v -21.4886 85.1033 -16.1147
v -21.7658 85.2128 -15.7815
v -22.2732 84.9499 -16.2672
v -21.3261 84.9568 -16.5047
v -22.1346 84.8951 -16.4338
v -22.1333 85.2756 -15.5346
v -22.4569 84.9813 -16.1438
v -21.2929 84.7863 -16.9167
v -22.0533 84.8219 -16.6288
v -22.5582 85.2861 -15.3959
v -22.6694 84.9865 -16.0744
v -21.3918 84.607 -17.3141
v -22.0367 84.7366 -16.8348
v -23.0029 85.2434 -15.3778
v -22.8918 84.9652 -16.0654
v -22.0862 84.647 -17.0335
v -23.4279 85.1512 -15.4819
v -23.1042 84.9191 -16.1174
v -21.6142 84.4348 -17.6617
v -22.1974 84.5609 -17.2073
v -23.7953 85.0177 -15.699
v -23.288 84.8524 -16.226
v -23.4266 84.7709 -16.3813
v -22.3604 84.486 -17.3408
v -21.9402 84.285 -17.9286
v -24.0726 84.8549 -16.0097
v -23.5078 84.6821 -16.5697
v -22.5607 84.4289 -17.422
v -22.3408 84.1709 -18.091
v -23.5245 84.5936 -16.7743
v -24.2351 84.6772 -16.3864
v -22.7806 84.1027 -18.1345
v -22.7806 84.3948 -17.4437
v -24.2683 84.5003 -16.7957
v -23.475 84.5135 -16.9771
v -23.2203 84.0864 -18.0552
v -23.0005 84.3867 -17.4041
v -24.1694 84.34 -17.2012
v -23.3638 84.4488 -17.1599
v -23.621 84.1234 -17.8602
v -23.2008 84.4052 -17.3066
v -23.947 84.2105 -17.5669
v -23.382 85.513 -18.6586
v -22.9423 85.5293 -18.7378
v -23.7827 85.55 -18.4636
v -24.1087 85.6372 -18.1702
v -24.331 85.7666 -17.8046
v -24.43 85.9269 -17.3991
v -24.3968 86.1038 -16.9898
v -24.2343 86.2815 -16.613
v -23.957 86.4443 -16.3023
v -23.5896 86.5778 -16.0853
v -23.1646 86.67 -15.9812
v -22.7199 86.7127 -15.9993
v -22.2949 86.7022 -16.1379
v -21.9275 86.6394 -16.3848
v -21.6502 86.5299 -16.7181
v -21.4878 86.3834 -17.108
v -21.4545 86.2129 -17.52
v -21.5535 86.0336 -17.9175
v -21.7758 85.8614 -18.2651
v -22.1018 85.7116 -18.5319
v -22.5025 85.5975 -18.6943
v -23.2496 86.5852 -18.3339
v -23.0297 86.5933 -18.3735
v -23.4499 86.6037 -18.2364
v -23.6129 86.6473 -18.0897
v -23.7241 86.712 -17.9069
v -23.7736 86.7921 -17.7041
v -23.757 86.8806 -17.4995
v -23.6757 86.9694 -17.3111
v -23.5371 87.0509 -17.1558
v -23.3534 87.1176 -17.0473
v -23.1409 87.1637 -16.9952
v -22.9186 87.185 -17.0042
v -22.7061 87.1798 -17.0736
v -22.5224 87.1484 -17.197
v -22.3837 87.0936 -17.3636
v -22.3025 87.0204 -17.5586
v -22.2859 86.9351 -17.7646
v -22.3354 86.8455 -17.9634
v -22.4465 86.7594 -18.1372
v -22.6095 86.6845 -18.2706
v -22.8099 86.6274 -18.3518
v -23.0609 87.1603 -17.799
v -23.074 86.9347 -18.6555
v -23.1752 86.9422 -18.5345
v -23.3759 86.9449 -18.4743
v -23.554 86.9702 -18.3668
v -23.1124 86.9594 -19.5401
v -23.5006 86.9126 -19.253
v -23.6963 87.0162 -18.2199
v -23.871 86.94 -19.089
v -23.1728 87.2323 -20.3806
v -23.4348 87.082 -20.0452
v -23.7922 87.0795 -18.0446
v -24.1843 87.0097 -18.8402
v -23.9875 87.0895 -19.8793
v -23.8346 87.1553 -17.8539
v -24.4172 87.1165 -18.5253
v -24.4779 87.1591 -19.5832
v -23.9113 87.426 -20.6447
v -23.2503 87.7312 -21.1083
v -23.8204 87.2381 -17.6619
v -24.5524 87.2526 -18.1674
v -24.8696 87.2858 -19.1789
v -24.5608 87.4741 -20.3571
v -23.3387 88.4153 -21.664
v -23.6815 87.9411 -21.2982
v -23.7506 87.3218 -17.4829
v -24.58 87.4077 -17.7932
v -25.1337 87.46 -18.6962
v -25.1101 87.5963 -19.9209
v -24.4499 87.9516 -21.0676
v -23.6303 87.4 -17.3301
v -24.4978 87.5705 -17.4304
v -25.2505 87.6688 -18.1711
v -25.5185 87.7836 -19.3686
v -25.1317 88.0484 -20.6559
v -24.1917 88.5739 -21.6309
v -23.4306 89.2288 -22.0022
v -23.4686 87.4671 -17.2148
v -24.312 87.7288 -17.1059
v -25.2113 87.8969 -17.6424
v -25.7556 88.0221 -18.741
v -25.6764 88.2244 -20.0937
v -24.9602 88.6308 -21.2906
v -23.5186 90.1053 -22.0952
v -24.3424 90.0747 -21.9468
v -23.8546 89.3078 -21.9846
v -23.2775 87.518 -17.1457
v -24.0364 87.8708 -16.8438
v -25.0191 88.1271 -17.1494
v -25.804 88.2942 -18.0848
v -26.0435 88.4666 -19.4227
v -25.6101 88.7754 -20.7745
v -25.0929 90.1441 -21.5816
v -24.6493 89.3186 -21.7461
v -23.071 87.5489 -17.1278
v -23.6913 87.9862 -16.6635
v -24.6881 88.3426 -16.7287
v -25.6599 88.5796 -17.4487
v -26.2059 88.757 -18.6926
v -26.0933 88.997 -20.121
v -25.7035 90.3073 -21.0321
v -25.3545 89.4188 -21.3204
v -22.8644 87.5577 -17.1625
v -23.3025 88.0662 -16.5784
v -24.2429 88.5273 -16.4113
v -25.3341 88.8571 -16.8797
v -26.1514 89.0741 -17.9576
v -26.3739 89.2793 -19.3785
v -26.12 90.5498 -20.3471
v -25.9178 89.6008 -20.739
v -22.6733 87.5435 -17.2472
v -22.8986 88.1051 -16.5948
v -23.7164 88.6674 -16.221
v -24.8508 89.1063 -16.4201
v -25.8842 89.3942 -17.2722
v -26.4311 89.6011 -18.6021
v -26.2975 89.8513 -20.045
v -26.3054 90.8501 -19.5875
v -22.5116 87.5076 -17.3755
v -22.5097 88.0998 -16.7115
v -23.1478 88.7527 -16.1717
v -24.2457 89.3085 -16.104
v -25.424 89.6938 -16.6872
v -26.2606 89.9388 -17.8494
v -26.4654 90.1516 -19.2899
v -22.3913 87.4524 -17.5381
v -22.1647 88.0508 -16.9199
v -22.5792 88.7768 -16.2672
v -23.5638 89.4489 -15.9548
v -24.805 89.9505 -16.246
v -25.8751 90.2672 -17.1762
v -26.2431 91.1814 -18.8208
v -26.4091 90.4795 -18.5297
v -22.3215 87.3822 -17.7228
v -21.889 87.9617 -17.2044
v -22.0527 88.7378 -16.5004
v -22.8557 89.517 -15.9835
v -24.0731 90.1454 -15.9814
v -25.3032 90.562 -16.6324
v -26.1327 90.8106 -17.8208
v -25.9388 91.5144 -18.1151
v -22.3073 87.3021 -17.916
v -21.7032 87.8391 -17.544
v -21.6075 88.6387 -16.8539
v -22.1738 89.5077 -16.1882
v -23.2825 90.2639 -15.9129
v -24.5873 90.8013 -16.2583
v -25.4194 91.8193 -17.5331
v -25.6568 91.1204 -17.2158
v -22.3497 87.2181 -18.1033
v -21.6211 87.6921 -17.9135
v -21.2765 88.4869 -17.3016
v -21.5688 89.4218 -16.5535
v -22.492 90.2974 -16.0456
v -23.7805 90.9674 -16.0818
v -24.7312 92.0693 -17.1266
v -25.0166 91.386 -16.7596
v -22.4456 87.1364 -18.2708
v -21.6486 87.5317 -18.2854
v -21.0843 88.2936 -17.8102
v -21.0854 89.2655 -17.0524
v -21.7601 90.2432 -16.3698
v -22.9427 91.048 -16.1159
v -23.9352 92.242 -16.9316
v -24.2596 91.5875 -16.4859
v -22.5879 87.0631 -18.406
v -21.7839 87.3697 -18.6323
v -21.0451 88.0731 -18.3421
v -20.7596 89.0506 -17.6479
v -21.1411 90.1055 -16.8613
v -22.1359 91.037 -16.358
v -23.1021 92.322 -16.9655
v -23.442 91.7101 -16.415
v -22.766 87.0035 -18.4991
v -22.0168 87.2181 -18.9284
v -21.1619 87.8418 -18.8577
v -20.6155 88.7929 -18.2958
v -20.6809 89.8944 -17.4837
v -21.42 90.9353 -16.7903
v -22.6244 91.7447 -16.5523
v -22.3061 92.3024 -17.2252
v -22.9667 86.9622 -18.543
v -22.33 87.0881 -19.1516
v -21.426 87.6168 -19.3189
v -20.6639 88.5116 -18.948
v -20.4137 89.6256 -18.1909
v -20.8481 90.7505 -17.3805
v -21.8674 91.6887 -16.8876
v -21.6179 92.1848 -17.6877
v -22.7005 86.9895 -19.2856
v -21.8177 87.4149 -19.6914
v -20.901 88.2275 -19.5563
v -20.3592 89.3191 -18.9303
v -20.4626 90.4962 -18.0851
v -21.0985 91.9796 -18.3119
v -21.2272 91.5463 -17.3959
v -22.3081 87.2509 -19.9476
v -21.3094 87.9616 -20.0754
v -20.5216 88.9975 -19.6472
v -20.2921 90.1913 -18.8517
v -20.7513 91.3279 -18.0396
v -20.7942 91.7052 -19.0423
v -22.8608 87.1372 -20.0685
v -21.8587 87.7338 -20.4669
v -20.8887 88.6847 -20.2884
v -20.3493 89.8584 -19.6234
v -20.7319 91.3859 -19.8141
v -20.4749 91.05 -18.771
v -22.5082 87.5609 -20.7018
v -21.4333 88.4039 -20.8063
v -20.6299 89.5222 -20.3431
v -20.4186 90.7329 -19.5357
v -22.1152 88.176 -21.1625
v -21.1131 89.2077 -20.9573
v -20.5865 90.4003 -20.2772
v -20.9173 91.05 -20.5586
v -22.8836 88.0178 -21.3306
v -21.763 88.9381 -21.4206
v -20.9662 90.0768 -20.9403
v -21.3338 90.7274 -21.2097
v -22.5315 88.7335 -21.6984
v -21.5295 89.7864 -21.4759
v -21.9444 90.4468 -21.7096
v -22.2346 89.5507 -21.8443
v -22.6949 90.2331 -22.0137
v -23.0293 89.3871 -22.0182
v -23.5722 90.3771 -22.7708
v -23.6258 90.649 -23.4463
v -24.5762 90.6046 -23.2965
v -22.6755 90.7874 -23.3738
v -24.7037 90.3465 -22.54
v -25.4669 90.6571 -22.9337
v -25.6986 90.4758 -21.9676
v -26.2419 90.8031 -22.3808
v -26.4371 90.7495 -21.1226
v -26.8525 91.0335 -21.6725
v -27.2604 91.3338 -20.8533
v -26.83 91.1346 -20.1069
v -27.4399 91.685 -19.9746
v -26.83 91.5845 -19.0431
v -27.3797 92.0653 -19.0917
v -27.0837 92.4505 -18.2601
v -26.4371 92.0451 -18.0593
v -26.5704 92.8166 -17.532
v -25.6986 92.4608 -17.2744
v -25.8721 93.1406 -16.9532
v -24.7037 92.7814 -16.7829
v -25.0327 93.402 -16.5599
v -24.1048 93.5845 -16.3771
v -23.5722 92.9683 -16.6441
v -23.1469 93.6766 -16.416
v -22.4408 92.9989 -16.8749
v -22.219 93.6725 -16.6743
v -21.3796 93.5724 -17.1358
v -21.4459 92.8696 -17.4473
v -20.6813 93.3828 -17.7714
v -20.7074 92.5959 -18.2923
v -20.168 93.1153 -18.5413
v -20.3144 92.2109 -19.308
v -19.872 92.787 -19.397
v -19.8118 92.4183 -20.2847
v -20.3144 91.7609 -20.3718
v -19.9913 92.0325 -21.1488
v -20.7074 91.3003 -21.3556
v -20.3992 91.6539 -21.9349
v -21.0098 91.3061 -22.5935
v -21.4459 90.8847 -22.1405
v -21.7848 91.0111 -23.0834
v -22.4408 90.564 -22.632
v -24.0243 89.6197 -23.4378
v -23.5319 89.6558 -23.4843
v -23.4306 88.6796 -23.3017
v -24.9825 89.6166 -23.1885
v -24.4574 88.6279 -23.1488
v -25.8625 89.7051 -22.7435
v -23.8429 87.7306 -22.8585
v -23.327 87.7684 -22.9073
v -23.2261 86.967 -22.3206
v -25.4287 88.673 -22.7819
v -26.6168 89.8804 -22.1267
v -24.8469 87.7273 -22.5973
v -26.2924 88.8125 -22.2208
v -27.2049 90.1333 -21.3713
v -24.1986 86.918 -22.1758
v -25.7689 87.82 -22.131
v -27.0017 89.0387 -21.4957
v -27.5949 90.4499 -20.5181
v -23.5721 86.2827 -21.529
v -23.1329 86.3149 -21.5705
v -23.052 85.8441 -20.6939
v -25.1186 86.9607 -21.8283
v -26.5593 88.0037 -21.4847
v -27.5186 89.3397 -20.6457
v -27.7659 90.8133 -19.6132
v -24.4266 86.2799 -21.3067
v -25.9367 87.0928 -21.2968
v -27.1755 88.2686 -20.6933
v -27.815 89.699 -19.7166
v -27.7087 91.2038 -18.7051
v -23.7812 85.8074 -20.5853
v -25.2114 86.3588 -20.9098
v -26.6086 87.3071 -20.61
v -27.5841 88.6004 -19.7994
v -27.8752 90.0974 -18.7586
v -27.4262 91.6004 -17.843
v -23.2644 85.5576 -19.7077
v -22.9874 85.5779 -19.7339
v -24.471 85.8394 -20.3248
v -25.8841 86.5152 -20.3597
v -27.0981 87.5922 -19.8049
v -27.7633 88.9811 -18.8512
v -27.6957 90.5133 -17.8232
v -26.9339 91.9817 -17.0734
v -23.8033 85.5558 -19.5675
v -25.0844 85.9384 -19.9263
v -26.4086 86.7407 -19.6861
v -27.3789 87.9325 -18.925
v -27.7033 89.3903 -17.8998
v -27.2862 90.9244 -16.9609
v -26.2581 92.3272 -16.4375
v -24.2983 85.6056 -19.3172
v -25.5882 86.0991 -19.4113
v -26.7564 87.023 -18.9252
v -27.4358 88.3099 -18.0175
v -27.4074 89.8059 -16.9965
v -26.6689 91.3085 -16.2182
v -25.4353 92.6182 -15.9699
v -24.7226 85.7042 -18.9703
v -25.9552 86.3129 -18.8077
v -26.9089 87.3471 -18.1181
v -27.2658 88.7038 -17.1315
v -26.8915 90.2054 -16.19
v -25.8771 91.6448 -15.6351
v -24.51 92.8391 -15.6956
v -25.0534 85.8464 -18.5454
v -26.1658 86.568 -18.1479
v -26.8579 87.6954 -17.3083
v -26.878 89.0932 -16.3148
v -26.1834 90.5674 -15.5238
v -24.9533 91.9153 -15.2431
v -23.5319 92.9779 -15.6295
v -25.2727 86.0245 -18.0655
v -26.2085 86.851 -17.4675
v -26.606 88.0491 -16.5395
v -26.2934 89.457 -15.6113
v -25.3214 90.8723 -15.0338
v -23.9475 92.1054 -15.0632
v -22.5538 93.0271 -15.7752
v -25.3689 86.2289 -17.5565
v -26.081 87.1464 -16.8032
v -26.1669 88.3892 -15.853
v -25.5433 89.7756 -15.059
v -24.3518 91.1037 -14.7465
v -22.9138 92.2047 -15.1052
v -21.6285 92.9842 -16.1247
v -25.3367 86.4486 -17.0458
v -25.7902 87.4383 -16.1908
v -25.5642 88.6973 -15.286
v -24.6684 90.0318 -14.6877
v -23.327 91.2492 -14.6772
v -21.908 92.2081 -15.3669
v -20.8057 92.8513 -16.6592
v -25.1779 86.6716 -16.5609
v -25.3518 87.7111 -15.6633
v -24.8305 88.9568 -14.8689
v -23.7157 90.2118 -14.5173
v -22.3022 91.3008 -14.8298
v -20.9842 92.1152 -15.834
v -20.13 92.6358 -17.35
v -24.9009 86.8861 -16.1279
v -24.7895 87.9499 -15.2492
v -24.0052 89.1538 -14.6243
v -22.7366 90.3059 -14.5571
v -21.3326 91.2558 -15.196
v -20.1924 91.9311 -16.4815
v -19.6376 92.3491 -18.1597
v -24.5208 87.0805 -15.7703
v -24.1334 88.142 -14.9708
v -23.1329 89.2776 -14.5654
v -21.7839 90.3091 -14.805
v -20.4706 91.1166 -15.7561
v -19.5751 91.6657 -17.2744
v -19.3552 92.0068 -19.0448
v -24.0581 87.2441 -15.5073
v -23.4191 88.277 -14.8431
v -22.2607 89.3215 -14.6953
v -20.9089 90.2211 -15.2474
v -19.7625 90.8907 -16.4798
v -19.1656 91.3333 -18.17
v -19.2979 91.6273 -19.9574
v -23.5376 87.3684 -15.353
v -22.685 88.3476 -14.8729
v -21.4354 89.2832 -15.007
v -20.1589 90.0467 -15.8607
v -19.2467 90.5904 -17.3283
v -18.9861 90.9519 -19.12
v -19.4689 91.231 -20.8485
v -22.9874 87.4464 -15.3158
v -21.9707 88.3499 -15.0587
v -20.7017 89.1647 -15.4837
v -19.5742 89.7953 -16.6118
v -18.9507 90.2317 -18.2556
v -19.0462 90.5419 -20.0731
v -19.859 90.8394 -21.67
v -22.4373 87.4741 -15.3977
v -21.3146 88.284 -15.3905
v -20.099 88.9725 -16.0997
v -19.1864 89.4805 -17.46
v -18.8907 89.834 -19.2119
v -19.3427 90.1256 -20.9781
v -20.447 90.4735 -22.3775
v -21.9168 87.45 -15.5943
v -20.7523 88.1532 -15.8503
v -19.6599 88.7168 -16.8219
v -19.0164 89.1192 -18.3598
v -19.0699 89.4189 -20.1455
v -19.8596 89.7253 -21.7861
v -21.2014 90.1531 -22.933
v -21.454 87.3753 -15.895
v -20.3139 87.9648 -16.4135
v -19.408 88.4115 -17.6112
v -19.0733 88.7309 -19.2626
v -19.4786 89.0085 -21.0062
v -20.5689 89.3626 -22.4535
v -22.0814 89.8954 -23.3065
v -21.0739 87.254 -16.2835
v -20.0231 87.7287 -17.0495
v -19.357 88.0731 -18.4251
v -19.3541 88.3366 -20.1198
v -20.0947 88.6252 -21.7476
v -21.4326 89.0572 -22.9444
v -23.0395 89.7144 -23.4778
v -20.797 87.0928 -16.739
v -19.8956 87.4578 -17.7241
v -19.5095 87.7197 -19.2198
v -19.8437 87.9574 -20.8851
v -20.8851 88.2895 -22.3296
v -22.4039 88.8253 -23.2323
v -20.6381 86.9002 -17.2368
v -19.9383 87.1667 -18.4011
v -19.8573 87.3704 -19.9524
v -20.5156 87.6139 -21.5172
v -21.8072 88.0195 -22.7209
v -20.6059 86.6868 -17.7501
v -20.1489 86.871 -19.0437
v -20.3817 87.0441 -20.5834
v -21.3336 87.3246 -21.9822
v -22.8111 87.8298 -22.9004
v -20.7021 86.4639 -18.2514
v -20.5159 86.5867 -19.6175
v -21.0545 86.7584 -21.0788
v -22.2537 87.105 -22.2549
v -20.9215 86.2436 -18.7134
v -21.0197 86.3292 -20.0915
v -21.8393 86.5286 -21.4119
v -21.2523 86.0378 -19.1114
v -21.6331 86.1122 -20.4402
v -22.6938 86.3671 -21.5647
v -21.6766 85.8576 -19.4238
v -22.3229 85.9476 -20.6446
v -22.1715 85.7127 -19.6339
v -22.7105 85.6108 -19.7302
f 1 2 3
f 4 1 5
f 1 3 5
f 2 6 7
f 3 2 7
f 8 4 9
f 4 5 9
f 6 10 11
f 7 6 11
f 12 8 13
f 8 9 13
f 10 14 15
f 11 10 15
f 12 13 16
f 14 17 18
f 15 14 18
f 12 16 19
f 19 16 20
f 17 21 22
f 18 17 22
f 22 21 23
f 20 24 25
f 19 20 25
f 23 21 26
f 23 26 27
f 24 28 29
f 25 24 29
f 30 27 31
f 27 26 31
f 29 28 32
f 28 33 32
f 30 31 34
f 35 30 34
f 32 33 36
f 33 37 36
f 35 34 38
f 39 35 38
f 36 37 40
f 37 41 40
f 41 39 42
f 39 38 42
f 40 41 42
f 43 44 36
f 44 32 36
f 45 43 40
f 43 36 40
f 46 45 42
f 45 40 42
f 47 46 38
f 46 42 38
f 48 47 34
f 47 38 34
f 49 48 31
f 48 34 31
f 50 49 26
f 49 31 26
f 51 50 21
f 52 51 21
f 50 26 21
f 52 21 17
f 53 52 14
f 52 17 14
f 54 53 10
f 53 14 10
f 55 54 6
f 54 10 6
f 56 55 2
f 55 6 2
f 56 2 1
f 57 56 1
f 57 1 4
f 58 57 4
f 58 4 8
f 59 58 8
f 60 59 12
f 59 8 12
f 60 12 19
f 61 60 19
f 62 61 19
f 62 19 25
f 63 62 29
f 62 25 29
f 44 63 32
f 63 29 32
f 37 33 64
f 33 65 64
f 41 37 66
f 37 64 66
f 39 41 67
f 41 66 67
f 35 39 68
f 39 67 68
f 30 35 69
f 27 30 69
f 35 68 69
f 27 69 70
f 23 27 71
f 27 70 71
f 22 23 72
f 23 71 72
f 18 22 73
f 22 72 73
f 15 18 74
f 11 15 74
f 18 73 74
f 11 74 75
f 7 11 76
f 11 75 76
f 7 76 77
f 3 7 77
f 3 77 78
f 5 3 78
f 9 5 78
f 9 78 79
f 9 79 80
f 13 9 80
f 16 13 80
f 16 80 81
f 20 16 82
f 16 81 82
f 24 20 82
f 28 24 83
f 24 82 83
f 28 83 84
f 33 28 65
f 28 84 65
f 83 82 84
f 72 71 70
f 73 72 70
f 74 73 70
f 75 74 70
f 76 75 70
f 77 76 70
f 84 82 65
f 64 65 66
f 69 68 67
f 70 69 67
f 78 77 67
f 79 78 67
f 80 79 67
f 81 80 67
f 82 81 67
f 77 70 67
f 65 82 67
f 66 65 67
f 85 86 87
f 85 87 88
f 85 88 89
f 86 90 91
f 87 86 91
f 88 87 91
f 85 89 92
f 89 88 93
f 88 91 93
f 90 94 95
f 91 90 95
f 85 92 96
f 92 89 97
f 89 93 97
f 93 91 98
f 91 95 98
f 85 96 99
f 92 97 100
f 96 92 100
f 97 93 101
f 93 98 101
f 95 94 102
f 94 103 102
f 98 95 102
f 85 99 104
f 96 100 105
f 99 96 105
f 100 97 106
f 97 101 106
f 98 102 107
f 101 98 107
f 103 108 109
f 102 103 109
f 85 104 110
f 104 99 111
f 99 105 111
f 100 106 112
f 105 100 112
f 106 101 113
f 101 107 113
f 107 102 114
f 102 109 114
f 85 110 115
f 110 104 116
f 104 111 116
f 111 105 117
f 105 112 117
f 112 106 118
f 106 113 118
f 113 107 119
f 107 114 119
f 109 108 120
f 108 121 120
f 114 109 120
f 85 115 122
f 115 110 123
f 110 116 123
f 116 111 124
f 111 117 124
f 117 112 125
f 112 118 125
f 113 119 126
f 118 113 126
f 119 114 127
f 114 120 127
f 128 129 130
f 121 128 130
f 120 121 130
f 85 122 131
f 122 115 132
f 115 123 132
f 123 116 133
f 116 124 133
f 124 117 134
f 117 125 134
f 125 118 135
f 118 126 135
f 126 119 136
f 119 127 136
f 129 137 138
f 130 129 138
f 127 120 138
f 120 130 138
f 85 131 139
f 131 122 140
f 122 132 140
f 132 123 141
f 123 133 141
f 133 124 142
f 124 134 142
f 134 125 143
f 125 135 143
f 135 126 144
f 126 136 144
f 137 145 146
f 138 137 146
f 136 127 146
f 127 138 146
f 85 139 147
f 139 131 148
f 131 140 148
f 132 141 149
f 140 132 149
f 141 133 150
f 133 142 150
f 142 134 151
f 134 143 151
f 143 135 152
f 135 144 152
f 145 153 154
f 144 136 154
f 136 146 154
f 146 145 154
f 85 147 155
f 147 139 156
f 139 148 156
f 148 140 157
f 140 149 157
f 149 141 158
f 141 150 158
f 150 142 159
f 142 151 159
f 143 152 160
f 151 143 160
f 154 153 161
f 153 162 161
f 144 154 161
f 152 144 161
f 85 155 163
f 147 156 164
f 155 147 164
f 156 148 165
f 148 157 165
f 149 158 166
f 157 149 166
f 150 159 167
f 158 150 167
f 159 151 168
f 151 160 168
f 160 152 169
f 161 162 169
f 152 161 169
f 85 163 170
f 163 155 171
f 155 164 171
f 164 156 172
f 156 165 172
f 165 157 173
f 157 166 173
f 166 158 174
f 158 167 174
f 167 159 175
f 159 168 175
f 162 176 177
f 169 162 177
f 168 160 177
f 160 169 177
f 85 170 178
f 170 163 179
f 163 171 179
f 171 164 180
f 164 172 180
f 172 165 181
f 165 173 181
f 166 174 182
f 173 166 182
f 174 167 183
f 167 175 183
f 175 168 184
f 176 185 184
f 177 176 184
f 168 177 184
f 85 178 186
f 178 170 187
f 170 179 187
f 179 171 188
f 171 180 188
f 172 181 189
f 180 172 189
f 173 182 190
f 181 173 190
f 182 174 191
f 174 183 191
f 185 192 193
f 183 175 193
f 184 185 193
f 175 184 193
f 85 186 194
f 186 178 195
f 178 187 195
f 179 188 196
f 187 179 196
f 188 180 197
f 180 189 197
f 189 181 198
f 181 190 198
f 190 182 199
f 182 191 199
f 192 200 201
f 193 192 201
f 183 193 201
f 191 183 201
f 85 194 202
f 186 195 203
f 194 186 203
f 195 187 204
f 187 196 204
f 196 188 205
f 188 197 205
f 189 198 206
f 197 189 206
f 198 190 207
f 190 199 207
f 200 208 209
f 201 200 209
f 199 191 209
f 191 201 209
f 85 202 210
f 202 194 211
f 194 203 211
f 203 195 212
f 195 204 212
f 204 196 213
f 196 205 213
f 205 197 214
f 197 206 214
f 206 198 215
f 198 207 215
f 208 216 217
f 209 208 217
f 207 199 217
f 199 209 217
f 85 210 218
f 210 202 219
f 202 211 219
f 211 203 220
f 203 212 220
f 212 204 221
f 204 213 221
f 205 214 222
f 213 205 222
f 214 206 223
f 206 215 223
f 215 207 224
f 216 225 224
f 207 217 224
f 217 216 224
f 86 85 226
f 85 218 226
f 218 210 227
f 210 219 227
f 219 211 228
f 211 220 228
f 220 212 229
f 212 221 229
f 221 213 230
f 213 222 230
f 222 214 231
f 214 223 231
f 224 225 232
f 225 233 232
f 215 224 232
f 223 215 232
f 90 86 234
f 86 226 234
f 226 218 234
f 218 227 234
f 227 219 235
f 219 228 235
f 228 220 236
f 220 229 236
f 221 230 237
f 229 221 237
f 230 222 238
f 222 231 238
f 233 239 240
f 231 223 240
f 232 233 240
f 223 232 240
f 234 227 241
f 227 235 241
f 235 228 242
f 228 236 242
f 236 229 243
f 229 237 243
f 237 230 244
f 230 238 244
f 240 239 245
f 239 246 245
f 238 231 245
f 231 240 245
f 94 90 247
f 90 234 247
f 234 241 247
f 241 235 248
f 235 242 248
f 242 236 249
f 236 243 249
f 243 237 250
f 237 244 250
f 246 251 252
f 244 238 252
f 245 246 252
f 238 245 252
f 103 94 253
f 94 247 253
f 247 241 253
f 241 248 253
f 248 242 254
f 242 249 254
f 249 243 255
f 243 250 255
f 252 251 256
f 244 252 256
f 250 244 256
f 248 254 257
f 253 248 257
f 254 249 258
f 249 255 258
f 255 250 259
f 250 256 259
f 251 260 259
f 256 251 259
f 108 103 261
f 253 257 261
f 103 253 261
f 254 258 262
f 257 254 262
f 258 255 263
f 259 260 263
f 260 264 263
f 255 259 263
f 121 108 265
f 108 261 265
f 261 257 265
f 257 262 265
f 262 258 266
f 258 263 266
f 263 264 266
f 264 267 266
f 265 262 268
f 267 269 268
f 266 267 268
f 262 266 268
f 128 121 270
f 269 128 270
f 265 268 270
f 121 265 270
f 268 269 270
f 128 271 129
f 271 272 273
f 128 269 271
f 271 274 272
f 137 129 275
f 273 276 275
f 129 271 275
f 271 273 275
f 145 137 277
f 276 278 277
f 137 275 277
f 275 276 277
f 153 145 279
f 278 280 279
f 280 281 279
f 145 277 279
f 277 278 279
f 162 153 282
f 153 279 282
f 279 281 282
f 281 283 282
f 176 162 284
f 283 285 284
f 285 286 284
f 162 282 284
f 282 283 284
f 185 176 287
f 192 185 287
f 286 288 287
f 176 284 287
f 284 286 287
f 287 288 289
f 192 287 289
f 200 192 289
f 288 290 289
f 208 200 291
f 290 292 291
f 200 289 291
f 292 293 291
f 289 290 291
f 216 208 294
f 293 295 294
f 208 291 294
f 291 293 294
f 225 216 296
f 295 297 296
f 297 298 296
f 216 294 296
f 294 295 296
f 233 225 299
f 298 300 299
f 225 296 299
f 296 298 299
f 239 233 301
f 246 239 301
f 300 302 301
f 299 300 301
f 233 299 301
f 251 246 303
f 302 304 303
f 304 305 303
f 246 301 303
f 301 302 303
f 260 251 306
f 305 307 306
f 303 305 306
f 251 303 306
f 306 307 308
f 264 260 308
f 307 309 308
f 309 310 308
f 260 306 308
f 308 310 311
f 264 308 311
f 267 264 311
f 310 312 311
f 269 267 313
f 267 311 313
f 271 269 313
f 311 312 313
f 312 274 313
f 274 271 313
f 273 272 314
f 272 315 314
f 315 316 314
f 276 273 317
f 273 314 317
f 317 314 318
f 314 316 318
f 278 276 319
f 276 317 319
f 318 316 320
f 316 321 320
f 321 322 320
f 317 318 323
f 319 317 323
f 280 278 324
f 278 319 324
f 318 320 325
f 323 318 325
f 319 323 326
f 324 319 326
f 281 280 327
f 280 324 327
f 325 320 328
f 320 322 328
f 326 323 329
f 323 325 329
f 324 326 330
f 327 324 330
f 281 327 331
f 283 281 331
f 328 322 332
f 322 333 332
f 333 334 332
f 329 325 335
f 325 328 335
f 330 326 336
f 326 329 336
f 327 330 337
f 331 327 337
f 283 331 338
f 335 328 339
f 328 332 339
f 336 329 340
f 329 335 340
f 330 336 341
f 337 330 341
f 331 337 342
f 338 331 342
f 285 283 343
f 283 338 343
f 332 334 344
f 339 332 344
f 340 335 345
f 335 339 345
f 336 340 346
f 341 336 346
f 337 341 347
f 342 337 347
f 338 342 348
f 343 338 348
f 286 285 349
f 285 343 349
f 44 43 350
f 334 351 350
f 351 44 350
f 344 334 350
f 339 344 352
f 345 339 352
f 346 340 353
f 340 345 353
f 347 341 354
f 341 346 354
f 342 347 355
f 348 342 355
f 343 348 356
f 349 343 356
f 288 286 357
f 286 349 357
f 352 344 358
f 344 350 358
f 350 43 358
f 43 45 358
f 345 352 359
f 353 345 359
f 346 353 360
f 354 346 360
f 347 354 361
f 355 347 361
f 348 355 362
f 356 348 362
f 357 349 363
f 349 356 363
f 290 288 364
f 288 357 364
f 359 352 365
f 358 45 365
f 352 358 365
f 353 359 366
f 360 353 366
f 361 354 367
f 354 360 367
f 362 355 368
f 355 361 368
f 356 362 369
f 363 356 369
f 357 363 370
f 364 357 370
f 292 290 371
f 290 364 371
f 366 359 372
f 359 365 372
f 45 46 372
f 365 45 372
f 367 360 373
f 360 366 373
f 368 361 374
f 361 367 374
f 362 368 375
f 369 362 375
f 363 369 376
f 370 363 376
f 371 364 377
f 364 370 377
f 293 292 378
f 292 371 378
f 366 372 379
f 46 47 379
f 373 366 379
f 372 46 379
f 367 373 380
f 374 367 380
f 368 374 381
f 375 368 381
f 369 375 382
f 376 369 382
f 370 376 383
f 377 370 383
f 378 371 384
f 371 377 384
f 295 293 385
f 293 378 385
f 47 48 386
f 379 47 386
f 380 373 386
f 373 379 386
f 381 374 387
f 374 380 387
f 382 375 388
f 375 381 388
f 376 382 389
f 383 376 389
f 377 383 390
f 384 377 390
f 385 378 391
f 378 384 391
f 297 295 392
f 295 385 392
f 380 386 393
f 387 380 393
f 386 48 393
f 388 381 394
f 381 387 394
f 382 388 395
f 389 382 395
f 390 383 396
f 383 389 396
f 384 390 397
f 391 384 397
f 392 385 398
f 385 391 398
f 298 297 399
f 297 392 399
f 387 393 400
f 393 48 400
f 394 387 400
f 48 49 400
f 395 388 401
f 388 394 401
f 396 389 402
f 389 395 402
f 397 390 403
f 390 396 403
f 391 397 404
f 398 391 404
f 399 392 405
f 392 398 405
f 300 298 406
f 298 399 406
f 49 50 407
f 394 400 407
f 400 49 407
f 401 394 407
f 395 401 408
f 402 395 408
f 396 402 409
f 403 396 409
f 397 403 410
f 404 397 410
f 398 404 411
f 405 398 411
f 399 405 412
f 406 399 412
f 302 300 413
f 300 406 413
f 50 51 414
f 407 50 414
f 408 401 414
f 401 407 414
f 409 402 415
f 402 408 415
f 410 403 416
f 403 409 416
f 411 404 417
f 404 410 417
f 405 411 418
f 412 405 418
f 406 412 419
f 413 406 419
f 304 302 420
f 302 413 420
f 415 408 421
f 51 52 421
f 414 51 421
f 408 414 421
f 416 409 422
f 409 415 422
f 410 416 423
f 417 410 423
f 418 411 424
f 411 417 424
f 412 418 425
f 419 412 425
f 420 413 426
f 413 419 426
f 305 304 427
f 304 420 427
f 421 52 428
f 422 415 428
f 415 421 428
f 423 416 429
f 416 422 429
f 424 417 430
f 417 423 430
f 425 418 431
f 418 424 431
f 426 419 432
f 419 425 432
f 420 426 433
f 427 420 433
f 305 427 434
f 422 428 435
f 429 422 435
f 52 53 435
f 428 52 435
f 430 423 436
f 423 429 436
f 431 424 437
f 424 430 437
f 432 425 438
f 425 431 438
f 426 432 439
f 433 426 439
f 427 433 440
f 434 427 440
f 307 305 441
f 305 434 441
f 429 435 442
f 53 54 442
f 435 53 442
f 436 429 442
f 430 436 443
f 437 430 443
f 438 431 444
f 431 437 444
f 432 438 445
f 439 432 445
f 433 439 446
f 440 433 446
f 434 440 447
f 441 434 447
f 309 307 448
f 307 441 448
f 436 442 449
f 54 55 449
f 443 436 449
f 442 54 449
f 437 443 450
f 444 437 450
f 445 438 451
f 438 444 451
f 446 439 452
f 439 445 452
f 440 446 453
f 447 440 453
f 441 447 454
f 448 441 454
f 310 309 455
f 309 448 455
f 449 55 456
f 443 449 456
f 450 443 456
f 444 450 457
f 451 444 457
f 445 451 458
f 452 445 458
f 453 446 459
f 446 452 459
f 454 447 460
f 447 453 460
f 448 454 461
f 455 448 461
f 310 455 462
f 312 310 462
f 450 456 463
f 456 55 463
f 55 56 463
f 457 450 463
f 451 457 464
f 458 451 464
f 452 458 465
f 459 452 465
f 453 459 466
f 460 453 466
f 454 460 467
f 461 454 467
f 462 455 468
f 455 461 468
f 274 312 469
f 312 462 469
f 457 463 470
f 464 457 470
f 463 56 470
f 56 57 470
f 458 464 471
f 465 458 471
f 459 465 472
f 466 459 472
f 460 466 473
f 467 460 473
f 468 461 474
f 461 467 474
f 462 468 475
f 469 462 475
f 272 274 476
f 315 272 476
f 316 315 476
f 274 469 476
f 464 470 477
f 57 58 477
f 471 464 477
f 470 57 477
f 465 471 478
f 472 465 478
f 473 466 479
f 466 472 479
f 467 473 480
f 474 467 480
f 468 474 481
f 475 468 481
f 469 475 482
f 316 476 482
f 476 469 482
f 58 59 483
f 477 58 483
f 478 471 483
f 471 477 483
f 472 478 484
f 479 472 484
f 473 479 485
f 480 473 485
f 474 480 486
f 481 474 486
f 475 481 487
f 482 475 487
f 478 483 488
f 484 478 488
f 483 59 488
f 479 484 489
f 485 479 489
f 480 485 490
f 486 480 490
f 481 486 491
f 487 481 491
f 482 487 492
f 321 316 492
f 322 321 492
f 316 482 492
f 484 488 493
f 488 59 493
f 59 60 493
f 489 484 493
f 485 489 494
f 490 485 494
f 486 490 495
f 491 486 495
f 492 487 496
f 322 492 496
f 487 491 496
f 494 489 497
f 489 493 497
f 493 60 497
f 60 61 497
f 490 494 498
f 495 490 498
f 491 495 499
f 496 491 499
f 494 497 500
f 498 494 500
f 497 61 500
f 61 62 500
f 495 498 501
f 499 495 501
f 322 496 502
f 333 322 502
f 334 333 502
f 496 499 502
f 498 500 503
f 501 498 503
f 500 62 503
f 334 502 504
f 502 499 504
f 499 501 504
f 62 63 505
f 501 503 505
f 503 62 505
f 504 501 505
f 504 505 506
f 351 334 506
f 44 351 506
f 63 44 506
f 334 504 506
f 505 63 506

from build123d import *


with BuildPart() as part:
    # Ball socket turned profile → Turned socket body (revolve)
    with BuildSketch(Plane(origin=(0, -6.839373114, 16.171317762), x_dir=(-1, 0, 0), z_dir=(0, 0.3895270342980127, -0.9210150322068553)), mode=Mode.PRIVATE) as turned_socket_body_sk:
        with BuildLine():
            Line((21.450363513, -86.228362345), (21.288694752, -84.679417142))
            Line((21.288694752, -84.679417142), (22.034642647, -84.601559983))
            Line((22.034642647, -84.601559983), (22.283785554, -86.988593249))
            Line((22.283785554, -86.988593249), (23.02973345, -86.91073609))
            Line((23.02973345, -86.91073609), (23.060876313, -87.209115249))
            ThreePointArc((23.060876313, -87.209115249), (20.609484536, -88.906958963), (20.724096138, -91.886700412))
            Line((20.724096138, -91.886700412), (19.804272172, -93.020911066))
            ThreePointArc((19.804272172, -93.020911066), (19.009273884, -89.232523486), (21.450363513, -86.228362345))
        make_face()
    revolve(turned_socket_body_sk.sketch.rotate(Axis((-24.42078135, -99.160389667, -22.874224953), (0.10380954475082833, 0.9160389667138149, 0.3874224953206928)), 90), axis=Axis((-24.42078135, -99.160389667, -22.874224953), (0.10380954475082833, 0.9160389667138149, 0.3874224953206928)))


with BuildPart() as body_2:
    # Mirror1: mirrored copy
    add(part.part.mirror(Plane(origin=(0, 0, 0), x_dir=(0, 0, 1), z_dir=(0, -1, 0))))


solid = body_2.part
